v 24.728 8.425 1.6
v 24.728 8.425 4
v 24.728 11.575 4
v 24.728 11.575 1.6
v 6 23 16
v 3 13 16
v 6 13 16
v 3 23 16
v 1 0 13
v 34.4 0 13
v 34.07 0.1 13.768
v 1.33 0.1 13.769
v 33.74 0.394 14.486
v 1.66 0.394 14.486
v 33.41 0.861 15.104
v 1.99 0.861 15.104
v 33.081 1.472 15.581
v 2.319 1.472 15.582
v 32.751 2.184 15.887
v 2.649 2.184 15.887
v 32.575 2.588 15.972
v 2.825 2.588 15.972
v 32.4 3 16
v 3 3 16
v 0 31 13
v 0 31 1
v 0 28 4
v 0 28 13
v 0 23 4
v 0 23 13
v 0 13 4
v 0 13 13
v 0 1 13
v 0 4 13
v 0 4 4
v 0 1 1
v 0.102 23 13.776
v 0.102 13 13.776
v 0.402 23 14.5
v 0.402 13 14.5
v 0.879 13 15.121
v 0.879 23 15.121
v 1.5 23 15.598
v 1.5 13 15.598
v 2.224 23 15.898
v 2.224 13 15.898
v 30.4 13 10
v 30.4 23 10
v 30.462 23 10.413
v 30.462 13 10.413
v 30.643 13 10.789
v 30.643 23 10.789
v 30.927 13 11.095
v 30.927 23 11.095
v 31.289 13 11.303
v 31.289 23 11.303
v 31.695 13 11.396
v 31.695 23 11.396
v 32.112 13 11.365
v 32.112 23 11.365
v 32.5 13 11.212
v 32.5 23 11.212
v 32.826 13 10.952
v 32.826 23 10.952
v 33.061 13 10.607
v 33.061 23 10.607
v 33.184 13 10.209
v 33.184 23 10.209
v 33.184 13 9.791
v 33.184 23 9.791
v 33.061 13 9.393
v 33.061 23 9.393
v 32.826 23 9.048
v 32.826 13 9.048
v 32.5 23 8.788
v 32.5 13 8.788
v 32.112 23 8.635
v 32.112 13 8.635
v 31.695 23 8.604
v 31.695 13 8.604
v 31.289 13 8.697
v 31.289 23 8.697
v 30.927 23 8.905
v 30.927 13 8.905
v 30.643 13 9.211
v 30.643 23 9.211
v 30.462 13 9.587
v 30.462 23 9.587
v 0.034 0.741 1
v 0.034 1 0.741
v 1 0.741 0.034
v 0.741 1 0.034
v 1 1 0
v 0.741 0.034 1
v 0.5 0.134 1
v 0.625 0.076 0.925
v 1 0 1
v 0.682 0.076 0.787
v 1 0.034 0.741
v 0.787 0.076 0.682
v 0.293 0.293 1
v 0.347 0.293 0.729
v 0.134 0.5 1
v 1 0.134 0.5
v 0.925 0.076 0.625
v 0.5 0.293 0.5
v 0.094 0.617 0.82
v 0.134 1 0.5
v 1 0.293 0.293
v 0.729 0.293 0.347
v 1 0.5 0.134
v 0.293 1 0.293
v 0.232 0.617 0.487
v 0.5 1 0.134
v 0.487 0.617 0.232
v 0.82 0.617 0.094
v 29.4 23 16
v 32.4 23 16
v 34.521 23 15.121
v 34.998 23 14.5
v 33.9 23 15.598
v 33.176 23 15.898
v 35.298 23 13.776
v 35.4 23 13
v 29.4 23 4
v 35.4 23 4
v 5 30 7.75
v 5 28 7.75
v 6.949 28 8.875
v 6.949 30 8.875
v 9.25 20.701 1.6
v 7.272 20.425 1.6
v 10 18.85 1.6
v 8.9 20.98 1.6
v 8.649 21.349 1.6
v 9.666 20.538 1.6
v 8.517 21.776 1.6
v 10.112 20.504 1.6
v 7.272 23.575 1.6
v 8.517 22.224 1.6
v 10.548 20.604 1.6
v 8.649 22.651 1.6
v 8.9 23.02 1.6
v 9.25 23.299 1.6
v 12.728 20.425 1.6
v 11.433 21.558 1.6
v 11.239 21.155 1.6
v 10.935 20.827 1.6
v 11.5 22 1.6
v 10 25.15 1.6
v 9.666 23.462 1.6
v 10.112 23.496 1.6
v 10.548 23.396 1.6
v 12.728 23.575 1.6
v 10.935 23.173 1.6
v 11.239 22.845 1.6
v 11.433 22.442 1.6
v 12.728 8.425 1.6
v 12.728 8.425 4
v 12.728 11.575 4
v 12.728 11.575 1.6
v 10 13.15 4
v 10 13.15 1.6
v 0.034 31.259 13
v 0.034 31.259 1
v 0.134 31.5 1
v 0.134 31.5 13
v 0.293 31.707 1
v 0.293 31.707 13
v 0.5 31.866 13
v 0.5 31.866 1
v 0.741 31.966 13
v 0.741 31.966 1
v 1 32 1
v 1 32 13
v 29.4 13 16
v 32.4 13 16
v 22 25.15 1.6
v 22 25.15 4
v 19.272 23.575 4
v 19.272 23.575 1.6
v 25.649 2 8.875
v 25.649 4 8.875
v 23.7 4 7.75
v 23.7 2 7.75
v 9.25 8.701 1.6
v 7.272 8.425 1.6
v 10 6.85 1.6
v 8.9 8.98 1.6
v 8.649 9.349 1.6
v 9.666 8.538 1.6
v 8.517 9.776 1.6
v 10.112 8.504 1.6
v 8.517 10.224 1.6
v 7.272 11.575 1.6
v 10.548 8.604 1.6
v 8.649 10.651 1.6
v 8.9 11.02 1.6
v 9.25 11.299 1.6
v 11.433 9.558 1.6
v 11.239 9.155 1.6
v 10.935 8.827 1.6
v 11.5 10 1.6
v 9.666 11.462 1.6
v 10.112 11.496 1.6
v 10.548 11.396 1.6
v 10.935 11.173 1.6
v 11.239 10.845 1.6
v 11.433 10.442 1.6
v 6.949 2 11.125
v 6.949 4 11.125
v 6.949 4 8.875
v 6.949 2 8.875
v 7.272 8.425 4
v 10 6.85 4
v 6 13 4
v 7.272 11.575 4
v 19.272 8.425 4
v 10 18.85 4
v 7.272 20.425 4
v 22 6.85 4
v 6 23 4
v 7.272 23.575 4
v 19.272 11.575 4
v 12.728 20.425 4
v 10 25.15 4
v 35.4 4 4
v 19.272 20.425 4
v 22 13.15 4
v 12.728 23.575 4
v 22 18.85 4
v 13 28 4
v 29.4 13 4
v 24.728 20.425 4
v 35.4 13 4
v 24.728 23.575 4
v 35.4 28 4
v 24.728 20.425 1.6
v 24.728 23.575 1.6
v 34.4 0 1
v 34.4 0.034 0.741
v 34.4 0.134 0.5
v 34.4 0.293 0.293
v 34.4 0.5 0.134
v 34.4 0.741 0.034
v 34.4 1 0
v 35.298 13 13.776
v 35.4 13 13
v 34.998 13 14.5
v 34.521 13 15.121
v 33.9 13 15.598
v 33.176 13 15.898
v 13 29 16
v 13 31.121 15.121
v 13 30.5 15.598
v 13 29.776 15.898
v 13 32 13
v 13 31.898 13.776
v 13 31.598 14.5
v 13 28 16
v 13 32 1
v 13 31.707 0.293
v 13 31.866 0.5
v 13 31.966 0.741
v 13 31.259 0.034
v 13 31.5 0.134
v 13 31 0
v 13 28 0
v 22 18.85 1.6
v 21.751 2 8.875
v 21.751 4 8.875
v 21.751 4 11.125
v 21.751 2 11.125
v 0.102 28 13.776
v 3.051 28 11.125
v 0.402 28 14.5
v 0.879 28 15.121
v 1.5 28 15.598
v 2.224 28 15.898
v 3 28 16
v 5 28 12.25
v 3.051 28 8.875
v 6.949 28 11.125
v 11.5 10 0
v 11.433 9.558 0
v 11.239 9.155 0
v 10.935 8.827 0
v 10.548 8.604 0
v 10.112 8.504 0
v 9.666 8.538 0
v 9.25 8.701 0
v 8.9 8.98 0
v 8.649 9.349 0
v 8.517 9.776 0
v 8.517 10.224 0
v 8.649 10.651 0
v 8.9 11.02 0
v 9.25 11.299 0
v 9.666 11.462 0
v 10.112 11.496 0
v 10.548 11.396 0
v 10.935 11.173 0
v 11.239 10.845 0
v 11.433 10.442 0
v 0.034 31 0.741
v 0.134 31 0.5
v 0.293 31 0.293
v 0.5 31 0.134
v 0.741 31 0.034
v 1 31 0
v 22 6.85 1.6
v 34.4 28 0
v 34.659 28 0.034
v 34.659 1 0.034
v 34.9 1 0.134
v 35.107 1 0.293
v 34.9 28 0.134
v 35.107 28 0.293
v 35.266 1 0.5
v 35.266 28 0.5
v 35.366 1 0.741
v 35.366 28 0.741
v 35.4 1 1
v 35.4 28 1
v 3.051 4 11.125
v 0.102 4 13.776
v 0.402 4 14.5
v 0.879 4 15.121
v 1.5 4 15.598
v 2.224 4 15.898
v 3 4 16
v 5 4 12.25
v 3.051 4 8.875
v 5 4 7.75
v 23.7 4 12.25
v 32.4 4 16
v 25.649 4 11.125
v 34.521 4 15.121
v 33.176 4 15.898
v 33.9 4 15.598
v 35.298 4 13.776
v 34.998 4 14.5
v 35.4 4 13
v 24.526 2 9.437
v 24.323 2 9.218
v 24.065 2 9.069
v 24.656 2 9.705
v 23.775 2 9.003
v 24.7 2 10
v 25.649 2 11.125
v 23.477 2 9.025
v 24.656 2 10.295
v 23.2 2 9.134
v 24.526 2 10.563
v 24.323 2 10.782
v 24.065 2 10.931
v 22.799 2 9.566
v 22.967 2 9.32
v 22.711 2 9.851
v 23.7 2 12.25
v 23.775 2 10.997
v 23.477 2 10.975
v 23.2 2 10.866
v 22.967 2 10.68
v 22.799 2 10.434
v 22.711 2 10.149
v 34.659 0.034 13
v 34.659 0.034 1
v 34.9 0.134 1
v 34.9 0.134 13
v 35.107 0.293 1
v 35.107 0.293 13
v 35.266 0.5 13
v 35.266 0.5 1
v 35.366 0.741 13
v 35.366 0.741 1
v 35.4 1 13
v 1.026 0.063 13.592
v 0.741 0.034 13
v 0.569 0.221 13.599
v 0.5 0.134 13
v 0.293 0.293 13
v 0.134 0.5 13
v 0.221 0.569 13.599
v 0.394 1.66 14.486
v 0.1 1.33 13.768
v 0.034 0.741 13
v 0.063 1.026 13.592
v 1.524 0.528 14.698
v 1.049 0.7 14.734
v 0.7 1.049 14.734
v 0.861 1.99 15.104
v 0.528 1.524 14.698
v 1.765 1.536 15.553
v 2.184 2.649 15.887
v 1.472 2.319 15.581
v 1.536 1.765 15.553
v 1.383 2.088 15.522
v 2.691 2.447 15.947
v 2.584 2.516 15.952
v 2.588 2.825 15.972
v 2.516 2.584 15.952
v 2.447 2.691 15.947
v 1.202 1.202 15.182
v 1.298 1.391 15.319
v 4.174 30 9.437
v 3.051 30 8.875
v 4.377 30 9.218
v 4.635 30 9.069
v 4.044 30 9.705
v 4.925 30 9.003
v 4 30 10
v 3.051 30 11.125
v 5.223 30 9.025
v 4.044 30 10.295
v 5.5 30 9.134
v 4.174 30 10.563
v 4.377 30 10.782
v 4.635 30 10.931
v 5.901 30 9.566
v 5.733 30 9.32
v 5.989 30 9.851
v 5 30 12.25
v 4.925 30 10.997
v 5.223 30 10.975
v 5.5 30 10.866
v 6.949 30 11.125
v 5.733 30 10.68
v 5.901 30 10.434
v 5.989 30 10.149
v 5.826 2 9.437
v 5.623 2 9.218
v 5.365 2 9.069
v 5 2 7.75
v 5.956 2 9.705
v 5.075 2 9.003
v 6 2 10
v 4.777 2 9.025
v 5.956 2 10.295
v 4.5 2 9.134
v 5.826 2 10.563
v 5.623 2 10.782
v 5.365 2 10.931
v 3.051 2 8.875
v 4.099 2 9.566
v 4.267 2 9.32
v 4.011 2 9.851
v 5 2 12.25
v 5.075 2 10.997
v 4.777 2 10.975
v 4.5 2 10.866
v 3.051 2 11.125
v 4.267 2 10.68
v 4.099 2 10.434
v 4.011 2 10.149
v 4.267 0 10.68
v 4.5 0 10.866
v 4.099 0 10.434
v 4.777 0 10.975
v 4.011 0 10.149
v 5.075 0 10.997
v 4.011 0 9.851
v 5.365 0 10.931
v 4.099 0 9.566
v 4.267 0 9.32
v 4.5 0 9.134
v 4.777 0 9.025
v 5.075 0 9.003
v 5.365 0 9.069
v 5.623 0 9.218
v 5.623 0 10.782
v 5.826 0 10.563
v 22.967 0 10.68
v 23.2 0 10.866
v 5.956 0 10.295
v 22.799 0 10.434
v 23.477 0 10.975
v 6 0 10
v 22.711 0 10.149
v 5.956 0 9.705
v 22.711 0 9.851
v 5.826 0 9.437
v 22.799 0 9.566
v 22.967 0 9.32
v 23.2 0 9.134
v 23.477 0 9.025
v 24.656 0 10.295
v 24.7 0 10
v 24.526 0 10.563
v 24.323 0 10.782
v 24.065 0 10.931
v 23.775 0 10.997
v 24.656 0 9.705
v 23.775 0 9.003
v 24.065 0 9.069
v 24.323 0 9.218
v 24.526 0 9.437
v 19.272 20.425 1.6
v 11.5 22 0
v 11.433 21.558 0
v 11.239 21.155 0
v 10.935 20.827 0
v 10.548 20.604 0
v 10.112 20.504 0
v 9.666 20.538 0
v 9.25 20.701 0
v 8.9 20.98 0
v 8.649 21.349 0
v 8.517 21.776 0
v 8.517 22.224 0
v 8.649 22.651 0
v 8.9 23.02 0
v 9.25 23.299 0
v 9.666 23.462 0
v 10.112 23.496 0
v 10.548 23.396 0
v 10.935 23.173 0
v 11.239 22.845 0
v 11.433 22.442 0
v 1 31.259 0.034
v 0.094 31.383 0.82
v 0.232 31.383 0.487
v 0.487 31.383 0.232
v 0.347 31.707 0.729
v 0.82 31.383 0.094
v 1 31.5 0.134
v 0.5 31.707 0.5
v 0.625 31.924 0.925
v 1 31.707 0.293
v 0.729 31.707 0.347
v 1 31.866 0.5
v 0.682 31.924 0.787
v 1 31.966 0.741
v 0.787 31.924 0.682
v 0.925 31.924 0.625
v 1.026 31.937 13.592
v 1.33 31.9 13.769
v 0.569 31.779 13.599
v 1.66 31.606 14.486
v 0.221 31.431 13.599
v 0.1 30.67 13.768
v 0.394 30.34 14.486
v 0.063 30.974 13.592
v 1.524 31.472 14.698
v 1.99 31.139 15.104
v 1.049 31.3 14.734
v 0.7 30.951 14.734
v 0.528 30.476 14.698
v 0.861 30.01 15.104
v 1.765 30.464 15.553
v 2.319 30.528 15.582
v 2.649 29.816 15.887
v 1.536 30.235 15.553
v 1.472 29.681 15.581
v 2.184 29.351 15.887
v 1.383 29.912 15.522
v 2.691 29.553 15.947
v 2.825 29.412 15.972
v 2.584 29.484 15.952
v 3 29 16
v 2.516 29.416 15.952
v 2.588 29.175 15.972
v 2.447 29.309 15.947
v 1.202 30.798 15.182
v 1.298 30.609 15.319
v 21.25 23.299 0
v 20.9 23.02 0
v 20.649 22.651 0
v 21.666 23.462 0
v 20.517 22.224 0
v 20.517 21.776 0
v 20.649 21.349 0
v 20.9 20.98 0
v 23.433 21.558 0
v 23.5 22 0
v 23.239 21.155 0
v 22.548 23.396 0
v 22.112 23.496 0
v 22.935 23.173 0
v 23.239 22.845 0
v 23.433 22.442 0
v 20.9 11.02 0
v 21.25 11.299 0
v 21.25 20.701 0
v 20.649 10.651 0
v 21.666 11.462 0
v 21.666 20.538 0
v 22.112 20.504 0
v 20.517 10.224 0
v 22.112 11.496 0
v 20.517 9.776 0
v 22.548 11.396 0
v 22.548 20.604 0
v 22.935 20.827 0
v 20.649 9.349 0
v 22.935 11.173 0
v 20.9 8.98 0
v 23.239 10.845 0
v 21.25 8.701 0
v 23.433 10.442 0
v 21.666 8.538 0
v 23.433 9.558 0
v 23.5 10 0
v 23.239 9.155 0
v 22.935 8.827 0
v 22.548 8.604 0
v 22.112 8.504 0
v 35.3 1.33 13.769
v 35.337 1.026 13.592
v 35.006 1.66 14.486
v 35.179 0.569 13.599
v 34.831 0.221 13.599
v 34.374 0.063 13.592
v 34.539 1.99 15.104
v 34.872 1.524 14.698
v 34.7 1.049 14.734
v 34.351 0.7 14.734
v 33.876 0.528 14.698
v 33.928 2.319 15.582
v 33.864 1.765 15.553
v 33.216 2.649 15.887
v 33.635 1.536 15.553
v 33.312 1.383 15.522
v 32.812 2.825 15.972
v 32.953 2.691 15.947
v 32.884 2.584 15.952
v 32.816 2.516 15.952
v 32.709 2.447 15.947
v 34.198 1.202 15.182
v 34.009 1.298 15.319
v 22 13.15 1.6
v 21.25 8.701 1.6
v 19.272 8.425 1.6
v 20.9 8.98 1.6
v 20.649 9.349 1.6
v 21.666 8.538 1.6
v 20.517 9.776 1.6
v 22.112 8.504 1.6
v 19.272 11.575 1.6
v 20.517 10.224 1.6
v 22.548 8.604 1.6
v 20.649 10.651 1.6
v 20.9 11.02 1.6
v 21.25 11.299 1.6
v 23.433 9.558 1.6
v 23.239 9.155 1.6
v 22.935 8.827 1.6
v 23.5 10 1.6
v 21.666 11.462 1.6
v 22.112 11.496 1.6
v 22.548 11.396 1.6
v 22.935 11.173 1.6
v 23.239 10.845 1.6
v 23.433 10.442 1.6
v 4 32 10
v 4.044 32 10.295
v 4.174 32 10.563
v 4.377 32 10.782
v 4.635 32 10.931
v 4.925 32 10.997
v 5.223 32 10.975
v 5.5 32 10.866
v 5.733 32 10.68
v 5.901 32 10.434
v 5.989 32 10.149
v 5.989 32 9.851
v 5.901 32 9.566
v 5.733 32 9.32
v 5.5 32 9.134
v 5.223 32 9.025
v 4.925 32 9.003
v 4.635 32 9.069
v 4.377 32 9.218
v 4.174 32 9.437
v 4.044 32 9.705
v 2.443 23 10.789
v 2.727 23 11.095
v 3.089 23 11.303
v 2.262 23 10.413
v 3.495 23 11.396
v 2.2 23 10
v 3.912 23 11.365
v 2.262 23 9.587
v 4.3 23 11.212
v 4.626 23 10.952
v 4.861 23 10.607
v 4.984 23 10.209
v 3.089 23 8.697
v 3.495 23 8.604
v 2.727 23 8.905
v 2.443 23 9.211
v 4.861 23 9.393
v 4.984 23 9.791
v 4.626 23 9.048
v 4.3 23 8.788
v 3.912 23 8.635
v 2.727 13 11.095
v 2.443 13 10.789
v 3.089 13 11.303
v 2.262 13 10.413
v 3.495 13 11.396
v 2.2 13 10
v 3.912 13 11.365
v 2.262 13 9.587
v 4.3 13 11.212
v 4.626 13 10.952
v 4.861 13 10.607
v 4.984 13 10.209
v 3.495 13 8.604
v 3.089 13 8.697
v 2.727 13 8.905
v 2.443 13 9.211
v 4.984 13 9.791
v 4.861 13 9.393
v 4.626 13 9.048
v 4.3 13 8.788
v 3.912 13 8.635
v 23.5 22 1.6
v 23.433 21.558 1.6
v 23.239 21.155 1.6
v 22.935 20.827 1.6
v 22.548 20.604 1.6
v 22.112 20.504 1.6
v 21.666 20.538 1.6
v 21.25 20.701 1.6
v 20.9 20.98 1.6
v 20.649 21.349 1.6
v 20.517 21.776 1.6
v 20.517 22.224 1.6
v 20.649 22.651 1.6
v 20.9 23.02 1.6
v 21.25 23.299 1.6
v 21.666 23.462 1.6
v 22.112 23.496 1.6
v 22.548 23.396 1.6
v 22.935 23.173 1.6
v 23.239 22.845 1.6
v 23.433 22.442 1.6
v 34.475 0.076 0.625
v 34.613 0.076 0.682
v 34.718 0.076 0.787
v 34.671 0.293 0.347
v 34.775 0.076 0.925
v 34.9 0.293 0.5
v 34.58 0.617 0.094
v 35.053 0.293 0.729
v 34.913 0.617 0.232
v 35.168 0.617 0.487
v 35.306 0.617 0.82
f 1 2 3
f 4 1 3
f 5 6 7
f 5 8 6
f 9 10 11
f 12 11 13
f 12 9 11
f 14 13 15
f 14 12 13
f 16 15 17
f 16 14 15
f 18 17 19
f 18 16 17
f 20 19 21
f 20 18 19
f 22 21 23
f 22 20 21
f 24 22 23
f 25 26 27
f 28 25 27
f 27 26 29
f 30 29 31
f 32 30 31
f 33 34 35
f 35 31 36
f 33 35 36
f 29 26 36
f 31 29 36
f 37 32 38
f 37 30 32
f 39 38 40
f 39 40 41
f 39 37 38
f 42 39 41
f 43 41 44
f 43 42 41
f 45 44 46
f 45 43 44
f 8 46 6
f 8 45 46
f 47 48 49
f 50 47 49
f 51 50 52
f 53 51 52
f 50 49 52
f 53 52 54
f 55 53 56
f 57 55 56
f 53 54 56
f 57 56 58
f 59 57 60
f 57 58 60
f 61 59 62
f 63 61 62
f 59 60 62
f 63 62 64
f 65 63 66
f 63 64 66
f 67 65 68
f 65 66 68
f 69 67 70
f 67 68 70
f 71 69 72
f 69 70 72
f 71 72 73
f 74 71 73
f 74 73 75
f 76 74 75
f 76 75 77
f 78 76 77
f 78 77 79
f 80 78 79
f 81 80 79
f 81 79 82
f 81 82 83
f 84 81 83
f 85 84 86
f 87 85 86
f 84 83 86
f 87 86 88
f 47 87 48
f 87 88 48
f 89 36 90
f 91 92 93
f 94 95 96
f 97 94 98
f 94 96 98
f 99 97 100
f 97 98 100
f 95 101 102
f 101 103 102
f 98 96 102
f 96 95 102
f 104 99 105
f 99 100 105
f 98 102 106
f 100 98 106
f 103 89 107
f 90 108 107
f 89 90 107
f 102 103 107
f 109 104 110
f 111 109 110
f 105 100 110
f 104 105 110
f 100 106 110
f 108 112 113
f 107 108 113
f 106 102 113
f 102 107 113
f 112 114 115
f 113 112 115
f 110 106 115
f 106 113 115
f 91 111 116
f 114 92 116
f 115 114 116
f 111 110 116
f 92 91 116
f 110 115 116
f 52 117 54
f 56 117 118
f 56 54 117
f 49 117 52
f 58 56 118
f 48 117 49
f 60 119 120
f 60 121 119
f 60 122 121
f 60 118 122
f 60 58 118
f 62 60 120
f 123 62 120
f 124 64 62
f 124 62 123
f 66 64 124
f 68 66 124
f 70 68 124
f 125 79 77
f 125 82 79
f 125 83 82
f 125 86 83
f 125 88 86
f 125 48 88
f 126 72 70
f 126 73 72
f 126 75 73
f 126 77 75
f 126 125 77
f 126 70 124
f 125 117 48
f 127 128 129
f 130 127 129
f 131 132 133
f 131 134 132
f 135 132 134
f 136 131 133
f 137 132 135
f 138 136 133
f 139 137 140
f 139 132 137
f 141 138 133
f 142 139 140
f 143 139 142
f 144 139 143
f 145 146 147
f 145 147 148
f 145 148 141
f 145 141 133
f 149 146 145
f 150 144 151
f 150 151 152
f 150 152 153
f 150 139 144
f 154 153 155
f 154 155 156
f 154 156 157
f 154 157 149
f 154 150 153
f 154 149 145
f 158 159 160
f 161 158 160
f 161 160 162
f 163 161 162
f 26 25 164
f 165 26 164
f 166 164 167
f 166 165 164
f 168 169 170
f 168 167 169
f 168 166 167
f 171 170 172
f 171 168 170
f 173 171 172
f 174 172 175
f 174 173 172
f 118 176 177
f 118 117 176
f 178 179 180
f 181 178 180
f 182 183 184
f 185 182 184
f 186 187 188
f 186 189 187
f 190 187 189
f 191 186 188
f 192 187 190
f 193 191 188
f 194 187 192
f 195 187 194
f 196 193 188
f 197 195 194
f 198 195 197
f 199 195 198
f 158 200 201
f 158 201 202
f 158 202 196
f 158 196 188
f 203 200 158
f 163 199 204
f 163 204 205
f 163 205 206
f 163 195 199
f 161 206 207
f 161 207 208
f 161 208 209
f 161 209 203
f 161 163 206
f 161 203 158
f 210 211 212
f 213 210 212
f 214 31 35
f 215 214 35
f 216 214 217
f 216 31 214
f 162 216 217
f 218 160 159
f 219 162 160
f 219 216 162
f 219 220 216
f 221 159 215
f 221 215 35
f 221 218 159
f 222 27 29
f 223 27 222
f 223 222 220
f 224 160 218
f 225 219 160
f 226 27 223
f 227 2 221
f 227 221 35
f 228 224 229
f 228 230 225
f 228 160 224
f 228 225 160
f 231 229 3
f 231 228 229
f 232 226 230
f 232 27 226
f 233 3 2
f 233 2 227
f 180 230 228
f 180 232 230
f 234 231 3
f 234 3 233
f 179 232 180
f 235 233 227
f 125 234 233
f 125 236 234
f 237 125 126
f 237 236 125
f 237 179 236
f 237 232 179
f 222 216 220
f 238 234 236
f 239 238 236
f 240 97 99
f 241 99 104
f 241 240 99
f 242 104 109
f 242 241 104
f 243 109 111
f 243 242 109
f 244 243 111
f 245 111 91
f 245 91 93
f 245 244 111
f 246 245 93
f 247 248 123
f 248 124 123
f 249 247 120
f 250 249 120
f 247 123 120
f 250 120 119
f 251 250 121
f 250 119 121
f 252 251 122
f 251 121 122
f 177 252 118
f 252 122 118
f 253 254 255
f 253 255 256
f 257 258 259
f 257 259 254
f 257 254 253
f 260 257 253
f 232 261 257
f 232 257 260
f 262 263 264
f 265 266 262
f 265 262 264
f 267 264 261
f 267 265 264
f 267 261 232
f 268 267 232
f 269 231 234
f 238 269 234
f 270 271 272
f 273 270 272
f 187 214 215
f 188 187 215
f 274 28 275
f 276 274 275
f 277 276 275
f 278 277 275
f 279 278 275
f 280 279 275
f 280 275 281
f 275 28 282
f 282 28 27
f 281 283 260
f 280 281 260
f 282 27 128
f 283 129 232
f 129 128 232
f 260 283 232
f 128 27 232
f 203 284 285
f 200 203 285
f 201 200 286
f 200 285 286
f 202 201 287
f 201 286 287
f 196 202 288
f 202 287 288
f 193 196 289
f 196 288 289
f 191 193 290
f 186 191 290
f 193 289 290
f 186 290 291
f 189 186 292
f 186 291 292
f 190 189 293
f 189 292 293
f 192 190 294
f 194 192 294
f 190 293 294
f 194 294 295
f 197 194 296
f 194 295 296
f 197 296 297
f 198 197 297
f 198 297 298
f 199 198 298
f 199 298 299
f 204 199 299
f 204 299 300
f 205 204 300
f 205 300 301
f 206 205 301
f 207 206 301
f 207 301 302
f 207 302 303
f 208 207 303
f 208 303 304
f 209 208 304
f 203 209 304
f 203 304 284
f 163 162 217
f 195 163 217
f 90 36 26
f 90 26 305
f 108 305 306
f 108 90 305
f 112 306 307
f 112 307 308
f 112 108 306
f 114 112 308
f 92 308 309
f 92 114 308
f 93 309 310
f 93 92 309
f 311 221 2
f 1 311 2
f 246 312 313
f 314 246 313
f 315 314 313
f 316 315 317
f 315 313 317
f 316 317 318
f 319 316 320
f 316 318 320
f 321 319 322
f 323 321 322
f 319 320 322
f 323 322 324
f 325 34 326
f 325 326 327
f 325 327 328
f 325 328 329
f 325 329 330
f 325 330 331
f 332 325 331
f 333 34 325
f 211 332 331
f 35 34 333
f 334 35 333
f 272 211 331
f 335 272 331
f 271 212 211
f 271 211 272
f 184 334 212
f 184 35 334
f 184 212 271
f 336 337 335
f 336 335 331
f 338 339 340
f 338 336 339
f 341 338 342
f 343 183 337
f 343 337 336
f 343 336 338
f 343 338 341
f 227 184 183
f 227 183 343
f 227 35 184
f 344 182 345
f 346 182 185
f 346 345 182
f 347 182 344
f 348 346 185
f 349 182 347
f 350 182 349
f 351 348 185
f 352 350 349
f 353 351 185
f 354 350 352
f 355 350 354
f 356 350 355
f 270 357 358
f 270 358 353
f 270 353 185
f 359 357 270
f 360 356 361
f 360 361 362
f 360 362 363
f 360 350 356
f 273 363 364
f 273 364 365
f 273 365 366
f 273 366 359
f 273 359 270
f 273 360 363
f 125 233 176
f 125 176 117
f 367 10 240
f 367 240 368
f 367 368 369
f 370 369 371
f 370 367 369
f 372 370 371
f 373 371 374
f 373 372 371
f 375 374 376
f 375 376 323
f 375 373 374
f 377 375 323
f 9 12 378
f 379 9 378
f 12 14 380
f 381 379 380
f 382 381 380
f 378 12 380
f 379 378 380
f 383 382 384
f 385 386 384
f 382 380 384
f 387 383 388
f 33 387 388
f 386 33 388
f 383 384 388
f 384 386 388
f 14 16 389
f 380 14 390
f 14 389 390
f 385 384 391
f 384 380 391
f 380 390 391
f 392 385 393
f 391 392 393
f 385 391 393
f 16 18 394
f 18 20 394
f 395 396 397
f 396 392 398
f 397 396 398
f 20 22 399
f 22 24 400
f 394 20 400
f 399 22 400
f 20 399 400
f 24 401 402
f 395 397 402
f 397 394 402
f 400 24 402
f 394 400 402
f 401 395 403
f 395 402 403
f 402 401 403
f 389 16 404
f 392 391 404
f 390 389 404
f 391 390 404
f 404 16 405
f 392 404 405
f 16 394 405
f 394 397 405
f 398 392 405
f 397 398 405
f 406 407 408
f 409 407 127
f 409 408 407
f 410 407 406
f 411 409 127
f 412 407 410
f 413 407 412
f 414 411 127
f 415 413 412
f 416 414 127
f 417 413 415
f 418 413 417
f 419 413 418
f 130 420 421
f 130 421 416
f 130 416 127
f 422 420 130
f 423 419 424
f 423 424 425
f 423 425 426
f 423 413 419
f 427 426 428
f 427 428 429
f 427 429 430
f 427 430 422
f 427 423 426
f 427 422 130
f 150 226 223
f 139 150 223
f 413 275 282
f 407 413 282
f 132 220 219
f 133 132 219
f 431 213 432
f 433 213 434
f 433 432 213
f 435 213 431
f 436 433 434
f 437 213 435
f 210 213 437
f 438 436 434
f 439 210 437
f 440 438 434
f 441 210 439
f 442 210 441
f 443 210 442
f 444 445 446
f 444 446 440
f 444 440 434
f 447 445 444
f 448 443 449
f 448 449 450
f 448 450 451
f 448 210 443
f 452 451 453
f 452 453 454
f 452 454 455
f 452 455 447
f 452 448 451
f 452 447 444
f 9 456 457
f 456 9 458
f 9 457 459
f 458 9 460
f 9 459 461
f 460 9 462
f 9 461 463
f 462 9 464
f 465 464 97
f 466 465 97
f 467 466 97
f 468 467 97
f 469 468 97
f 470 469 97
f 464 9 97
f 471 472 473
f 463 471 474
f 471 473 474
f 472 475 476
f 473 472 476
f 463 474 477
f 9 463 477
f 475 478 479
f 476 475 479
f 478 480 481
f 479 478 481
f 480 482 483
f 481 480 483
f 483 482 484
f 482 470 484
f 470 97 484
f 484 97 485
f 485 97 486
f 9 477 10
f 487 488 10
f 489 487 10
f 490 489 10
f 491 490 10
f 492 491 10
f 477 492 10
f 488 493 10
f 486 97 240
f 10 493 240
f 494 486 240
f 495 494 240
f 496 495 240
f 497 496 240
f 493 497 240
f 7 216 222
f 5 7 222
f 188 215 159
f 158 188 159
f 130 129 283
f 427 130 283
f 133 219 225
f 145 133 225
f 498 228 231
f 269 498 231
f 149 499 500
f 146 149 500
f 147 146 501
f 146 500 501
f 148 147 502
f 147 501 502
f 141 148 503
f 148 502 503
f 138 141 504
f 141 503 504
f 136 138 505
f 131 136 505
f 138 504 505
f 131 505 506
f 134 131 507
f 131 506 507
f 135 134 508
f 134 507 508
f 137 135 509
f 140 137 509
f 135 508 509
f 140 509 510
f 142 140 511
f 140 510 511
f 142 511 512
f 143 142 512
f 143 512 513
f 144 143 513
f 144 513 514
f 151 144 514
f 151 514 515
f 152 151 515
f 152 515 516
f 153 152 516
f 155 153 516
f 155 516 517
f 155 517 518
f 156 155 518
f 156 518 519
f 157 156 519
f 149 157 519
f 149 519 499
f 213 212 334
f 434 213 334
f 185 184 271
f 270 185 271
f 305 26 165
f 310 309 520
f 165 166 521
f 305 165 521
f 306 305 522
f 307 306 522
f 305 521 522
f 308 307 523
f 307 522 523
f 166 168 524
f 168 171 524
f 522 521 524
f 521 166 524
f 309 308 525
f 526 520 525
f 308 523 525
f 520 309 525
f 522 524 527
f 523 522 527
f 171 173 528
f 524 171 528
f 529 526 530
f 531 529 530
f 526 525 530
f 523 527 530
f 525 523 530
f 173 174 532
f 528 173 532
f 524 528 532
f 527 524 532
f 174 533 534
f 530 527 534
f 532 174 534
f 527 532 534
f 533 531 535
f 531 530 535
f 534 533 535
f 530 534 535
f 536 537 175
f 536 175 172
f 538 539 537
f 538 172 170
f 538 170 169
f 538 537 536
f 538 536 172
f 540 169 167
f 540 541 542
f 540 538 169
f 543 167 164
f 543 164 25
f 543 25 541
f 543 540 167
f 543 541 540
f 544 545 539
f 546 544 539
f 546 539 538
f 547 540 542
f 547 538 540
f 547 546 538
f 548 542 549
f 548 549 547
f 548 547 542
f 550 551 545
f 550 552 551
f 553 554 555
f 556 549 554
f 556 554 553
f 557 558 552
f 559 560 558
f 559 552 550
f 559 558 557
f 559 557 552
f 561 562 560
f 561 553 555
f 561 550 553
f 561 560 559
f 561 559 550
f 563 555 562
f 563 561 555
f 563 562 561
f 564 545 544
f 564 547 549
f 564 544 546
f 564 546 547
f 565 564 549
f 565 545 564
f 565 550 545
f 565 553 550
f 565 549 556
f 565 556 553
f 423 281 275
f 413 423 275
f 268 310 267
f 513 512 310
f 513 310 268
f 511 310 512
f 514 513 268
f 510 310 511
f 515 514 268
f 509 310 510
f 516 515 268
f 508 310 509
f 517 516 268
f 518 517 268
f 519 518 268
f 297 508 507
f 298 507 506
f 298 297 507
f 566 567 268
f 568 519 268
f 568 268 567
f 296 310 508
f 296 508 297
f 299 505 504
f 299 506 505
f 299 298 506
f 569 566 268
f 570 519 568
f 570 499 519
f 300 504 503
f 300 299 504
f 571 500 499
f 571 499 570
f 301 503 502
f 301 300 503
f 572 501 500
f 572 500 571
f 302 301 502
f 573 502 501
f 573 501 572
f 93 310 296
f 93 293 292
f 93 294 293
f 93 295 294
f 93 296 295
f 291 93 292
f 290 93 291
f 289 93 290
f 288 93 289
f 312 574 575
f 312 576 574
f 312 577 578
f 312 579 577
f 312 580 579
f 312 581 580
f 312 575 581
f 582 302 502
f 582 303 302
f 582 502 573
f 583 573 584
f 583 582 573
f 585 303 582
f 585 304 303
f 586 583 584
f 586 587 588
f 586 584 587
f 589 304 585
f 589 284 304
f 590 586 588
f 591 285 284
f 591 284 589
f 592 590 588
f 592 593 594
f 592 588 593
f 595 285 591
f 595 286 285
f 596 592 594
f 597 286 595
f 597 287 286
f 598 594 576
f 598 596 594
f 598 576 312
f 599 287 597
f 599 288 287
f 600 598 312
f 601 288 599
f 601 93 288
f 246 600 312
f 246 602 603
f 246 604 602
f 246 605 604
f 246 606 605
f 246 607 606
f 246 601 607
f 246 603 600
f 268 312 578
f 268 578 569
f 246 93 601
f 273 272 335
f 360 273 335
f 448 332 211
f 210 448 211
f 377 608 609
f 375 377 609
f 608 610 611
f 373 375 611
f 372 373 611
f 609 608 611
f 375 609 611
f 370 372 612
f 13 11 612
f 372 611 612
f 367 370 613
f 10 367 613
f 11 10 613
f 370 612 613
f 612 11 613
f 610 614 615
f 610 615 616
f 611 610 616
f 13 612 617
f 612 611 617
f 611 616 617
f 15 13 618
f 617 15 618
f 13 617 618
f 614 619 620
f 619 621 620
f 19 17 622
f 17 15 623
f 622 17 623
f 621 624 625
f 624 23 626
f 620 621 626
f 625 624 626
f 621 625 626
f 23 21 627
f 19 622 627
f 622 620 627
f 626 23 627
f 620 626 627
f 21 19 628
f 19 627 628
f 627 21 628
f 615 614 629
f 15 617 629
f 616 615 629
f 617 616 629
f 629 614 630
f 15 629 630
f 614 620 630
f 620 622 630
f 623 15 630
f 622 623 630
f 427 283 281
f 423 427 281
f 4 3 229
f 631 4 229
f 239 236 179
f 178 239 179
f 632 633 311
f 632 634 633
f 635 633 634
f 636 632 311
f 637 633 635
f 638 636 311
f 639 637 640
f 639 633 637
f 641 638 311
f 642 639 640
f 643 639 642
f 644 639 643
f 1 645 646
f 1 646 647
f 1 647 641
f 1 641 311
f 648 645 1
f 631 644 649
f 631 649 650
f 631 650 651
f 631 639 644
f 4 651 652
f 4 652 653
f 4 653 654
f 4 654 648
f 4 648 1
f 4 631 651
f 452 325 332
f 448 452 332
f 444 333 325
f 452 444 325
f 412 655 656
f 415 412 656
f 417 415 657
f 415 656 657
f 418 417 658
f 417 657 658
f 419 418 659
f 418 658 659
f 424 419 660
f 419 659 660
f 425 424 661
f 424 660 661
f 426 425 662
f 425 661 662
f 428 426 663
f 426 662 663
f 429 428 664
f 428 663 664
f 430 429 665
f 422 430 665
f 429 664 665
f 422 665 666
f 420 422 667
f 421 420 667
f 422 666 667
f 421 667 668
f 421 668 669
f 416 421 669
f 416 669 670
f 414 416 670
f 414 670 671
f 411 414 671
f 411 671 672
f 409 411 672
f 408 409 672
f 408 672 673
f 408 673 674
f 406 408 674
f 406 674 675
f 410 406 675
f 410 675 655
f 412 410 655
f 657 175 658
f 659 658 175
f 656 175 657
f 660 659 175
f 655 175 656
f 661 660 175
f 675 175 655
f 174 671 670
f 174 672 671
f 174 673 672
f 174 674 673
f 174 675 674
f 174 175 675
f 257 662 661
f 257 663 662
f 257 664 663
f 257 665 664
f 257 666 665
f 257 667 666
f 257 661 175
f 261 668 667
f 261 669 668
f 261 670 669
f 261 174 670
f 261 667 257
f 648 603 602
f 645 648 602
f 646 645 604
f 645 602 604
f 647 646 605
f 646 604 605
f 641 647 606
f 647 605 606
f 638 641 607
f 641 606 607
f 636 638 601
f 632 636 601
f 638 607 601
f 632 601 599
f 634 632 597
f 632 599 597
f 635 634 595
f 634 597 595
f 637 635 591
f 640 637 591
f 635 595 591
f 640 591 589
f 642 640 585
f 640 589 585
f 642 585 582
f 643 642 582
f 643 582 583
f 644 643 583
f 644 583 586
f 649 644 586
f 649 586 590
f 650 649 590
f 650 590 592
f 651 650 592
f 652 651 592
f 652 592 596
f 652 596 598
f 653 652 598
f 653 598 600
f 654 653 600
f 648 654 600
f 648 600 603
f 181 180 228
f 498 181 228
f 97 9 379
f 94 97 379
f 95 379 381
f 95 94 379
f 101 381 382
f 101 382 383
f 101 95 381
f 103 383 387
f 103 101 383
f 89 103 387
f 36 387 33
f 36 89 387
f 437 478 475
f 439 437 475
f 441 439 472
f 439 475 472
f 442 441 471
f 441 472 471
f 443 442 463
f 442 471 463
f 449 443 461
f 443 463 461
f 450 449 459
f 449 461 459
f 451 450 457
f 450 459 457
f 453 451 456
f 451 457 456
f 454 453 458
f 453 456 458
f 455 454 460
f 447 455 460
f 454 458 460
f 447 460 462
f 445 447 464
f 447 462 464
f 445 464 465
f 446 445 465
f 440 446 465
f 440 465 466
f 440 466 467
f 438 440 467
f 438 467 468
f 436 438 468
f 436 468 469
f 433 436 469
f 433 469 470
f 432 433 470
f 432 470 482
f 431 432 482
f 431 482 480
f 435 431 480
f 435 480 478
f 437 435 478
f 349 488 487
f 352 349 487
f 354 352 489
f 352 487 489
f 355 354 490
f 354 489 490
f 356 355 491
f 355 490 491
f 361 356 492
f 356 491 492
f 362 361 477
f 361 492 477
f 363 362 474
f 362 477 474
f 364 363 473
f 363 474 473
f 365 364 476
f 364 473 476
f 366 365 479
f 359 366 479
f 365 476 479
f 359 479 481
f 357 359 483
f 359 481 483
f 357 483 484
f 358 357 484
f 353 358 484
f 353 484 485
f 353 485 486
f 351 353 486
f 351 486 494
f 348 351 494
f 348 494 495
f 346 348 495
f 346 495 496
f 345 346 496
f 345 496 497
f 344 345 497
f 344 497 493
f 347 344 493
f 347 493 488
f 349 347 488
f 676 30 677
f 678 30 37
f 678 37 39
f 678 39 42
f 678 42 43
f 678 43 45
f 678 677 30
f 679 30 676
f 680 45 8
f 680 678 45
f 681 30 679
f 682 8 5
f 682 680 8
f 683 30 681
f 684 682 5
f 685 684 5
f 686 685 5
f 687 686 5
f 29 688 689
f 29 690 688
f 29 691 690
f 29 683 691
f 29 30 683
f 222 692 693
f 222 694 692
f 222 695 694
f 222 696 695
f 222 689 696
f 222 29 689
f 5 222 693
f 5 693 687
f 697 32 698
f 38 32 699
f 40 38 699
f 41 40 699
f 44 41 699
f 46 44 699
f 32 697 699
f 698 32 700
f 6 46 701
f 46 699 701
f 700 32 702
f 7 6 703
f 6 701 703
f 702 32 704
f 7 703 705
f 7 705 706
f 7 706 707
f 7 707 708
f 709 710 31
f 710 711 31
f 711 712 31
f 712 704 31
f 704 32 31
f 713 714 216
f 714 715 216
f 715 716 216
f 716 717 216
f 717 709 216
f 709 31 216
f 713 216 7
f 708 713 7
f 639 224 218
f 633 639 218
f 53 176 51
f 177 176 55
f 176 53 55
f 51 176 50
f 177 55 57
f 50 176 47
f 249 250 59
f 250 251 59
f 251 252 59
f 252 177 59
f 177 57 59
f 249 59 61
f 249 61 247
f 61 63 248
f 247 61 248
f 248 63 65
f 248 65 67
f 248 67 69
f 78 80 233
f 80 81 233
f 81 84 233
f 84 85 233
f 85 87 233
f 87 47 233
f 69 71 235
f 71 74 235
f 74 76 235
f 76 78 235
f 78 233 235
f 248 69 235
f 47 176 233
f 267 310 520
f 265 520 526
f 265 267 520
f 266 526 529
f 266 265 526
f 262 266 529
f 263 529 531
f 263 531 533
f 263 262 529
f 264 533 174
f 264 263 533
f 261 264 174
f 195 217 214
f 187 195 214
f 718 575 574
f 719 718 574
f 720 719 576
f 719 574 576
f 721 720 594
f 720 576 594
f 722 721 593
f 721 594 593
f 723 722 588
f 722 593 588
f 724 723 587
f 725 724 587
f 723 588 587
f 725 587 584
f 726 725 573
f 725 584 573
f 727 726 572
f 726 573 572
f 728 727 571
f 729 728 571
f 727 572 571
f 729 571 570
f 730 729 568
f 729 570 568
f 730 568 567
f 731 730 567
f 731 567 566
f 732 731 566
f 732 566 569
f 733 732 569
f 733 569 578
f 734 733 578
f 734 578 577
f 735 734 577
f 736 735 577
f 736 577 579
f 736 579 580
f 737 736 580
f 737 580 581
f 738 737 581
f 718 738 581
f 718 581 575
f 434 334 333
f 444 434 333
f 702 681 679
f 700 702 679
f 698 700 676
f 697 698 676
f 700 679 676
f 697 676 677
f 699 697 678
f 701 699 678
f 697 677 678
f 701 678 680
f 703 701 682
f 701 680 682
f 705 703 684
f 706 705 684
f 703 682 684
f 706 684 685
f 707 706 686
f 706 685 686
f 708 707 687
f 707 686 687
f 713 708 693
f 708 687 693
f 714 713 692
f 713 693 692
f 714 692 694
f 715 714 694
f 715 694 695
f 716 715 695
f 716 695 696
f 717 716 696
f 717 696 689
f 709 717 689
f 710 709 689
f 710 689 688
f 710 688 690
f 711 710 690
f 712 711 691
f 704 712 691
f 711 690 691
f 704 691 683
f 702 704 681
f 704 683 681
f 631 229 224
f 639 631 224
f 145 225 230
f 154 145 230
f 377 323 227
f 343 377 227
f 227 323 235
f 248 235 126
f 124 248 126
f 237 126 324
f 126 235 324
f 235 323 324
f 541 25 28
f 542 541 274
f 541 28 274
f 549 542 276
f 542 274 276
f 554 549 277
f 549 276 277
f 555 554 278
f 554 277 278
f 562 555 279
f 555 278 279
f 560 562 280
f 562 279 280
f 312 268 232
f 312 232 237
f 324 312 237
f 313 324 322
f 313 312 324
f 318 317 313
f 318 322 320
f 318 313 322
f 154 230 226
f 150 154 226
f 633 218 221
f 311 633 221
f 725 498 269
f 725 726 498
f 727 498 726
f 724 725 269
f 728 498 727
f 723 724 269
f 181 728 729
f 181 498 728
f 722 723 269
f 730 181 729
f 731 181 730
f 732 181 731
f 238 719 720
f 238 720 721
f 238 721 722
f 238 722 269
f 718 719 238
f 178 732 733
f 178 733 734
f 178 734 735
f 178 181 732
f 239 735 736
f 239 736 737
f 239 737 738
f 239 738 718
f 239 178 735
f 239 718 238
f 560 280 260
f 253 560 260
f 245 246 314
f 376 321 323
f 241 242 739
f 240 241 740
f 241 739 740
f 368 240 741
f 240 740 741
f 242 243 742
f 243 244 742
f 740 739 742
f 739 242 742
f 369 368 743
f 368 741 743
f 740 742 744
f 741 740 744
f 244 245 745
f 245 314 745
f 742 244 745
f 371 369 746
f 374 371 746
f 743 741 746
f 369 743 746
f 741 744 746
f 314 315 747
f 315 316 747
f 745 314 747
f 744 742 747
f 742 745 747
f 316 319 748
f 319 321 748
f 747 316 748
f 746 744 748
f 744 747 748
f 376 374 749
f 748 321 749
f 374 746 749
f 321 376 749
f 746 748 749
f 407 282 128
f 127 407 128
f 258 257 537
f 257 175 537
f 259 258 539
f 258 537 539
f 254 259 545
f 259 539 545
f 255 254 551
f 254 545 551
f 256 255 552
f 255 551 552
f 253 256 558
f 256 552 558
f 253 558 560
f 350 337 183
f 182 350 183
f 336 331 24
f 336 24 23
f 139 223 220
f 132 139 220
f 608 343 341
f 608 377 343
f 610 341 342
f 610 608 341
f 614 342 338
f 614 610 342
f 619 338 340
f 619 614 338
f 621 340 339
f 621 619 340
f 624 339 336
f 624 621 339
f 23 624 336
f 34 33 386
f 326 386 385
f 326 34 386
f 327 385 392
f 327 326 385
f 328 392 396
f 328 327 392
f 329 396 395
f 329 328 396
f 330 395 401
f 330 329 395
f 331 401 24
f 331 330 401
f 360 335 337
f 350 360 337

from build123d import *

# Parameters (mm, degrees)
SKETCH_W        = 35.4
SKETCH_H        = 24
PAD_DEPTH       = 4
SKETCH001_W     = 35.4
SKETCH001_H     = 4
PAD001_DEPTH    = 16
SKETCH003_W     = 6
SKETCH003_H     = 10
PAD003_DEPTH    = 16
SKETCH004_R     = 1.4
POCKET_DEPTH    = 10
SKETCH005_W     = 6
SKETCH005_H     = 10
PAD004_DEPTH    = 16
SKETCH006_R     = 1.4
POCKET001_DEPTH = 10
SKETCH007_W     = 13
SKETCH007_H     = 4
PAD005_DEPTH    = 16
POCKET002_DEPTH = 2.4
SKETCH009_R     = 1.5
POCKET003_DEPTH = 5
POCKET004_DEPTH = 2
SKETCH011_R     = 1
POCKET005_DEPTH = 5
POCKET006_DEPTH = 2
SKETCH013_R     = 1
POCKET007_DEPTH = 5
FILLET_R        = 1
FILLET001_R     = 1
FILLET002_R     = 1
FILLET003_R     = 1
FILLET004_R     = 3
FILLET005_R     = 3
FILLET006_R     = 3
FILLET007_R     = 3


with BuildPart() as part:
    # Sketch → Pad (new body)
    with BuildSketch(Plane.XY):
        with Locations((17.7, 16)):
            Rectangle(SKETCH_W, SKETCH_H)
    extrude(amount=PAD_DEPTH)

    # Sketch001 → Pad001 (join)
    with BuildSketch(Plane.XY):
        with Locations((17.7, 2)):
            Rectangle(SKETCH001_W, SKETCH001_H)
    extrude(amount=PAD001_DEPTH)

    # Sketch003 → Pad003 (join)
    with BuildSketch(Plane.XY):
        with Locations((3, 18)):
            Rectangle(SKETCH003_W, SKETCH003_H)
    extrude(amount=PAD003_DEPTH)

    # Sketch004 (on Face14 of Pad003) → Pocket (cut)
    with BuildSketch(Plane(origin=(0, 23, 0), x_dir=(-1, 0, 0), z_dir=(0, 1, 0))):
        with Locations((-3.6, 10)):
            Circle(SKETCH004_R)
    extrude(amount=-POCKET_DEPTH, mode=Mode.SUBTRACT)

    # Sketch005 → Pad004 (join)
    with BuildSketch(Plane.XY):
        with Locations((32.4, 18)):
            Rectangle(SKETCH005_W, SKETCH005_H)
    extrude(amount=PAD004_DEPTH)

    # Sketch006 (on Face13 of Pad004) → Pocket001 (cut)
    with BuildSketch(Plane(origin=(0, 23, 0), x_dir=(-1, 0, 0), z_dir=(0, 1, 0))):
        with Locations((-31.8, 10)):
            Circle(SKETCH006_R)
    extrude(amount=-POCKET001_DEPTH, mode=Mode.SUBTRACT)

    # Sketch007 (on Face4 of Pocket001) → Pad005 (join)
    with BuildSketch(Plane(origin=(0, 0, 0), x_dir=(1, 0, 0), z_dir=(0, 0, -1))):
        with Locations((6.5, -30)):
            Rectangle(SKETCH007_W, SKETCH007_H)
    extrude(amount=-PAD005_DEPTH)

    # Sketch008 (on Face4 of Pad005) → Pocket002 (cut)
    with BuildSketch(Plane.XY.offset(4)):
        Polygon((12.72798, 20.425), (12.72798, 23.575), (10, 25.15), (7.27202, 23.575), (7.27202, 20.425), (10, 18.85), align=None)
        Polygon((24.72798, 20.425), (24.72798, 23.575), (22, 25.15), (19.27202, 23.575), (19.27202, 20.425), (22, 18.85), align=None)
        Polygon((12.72798, 11.575), (10, 13.15), (7.27202, 11.575), (7.27202, 8.425), (10, 6.85), (12.72798, 8.425), align=None)
        Polygon((24.72798, 8.425), (24.72798, 11.575), (22, 13.15), (19.27202, 11.575), (19.27202, 8.425), (22, 6.85), align=None)
    extrude(amount=-POCKET002_DEPTH, mode=Mode.SUBTRACT)

    # Sketch009 (on Face2 of Pocket002) → Pocket003 (cut)
    with BuildSketch(Plane(origin=(0, 0, 0), x_dir=(1, 0, 0), z_dir=(0, 0, -1))):
        with Locations((10, -10)):
            Circle(SKETCH009_R)
        with Locations((22, -10)):
            Circle(SKETCH009_R)
        with Locations((22, -22)):
            Circle(SKETCH009_R)
        with Locations((10, -22)):
            Circle(SKETCH009_R)
    extrude(amount=-POCKET003_DEPTH, mode=Mode.SUBTRACT)

    # Sketch010 (on Face25 of Pocket003) → Pocket004 (cut)
    with BuildSketch(Plane(origin=(0, 4, 0), x_dir=(-1, 0, 0), z_dir=(0, 1, 0))):
        Polygon((-3.051443, 8.875), (-3.051443, 11.125), (-5, 12.25), (-6.948557, 11.125), (-6.948557, 8.875), (-5, 7.75), align=None)
        Polygon((-21.751443, 8.875), (-21.751443, 11.125), (-23.7, 12.25), (-25.648557, 11.125), (-25.648557, 8.875), (-23.7, 7.75), align=None)
    extrude(amount=-POCKET004_DEPTH, mode=Mode.SUBTRACT)

    # Sketch011 (on Face55 of Pocket004) → Pocket005 (cut)
    with BuildSketch(Plane.XZ):
        with Locations((5, 10)):
            Circle(SKETCH011_R)
        with Locations((23.7, 10)):
            Circle(SKETCH011_R)
    extrude(amount=-POCKET005_DEPTH, mode=Mode.SUBTRACT)

    # Sketch012 (on Face18 of Pocket005) → Pocket006 (cut)
    with BuildSketch(Plane.XZ.offset(-28)):
        Polygon((6.948557, 11.125), (5, 12.25), (3.051443, 11.125), (3.051443, 8.875), (5, 7.75), (6.948557, 8.875), align=None)
    extrude(amount=-POCKET006_DEPTH, mode=Mode.SUBTRACT)

    # Sketch013 (on Face50 of Pocket006) → Pocket007 (cut)
    with BuildSketch(Plane(origin=(0, 32, 0), x_dir=(-1, 0, 0), z_dir=(0, 1, 0))):
        with Locations((-5, 10)):
            Circle(SKETCH013_R)
    extrude(amount=-POCKET007_DEPTH, mode=Mode.SUBTRACT)

    # Fillet
    fillet_edges = [part.edges().sort_by_distance(p)[0] for p in [
        (0, 18, 0),
    ]]
    fillet(fillet_edges, radius=FILLET_R)

    # Fillet001
    fillet001_edges = [part.edges().sort_by_distance(p)[0] for p in [
        (35.4, 18, 0),
    ]]
    fillet(fillet001_edges, radius=FILLET001_R)

    # Fillet002
    fillet002_edges = [part.edges().sort_by_distance(p)[0] for p in [
        (17.7, 0, 0),
    ]]
    fillet(fillet002_edges, radius=FILLET002_R)

    # Fillet003
    fillet003_edges = [part.edges().sort_by_distance(p)[0] for p in [
        (7, 32, 0),
    ]]
    fillet(fillet003_edges, radius=FILLET003_R)

    # Fillet004
    fillet004_edges = [part.edges().sort_by_distance(p)[0] for p in [
        (0, 18, 16),
    ]]
    fillet(fillet004_edges, radius=FILLET004_R)

    # Fillet005
    fillet005_edges = [part.edges().sort_by_distance(p)[0] for p in [
        (0, 29.5, 16),
    ]]
    fillet(fillet005_edges, radius=FILLET005_R)

    # Fillet006
    fillet006_edges = [part.edges().sort_by_distance(p)[0] for p in [
        (0, 2.5, 16),
    ]]
    fillet(fillet006_edges, radius=FILLET006_R)

    # Fillet007
    fillet007_edges = [part.edges().sort_by_distance(p)[0] for p in [
        (35.4, 18, 16),
    ]]
    fillet(fillet007_edges, radius=FILLET007_R)


solid = part.part
